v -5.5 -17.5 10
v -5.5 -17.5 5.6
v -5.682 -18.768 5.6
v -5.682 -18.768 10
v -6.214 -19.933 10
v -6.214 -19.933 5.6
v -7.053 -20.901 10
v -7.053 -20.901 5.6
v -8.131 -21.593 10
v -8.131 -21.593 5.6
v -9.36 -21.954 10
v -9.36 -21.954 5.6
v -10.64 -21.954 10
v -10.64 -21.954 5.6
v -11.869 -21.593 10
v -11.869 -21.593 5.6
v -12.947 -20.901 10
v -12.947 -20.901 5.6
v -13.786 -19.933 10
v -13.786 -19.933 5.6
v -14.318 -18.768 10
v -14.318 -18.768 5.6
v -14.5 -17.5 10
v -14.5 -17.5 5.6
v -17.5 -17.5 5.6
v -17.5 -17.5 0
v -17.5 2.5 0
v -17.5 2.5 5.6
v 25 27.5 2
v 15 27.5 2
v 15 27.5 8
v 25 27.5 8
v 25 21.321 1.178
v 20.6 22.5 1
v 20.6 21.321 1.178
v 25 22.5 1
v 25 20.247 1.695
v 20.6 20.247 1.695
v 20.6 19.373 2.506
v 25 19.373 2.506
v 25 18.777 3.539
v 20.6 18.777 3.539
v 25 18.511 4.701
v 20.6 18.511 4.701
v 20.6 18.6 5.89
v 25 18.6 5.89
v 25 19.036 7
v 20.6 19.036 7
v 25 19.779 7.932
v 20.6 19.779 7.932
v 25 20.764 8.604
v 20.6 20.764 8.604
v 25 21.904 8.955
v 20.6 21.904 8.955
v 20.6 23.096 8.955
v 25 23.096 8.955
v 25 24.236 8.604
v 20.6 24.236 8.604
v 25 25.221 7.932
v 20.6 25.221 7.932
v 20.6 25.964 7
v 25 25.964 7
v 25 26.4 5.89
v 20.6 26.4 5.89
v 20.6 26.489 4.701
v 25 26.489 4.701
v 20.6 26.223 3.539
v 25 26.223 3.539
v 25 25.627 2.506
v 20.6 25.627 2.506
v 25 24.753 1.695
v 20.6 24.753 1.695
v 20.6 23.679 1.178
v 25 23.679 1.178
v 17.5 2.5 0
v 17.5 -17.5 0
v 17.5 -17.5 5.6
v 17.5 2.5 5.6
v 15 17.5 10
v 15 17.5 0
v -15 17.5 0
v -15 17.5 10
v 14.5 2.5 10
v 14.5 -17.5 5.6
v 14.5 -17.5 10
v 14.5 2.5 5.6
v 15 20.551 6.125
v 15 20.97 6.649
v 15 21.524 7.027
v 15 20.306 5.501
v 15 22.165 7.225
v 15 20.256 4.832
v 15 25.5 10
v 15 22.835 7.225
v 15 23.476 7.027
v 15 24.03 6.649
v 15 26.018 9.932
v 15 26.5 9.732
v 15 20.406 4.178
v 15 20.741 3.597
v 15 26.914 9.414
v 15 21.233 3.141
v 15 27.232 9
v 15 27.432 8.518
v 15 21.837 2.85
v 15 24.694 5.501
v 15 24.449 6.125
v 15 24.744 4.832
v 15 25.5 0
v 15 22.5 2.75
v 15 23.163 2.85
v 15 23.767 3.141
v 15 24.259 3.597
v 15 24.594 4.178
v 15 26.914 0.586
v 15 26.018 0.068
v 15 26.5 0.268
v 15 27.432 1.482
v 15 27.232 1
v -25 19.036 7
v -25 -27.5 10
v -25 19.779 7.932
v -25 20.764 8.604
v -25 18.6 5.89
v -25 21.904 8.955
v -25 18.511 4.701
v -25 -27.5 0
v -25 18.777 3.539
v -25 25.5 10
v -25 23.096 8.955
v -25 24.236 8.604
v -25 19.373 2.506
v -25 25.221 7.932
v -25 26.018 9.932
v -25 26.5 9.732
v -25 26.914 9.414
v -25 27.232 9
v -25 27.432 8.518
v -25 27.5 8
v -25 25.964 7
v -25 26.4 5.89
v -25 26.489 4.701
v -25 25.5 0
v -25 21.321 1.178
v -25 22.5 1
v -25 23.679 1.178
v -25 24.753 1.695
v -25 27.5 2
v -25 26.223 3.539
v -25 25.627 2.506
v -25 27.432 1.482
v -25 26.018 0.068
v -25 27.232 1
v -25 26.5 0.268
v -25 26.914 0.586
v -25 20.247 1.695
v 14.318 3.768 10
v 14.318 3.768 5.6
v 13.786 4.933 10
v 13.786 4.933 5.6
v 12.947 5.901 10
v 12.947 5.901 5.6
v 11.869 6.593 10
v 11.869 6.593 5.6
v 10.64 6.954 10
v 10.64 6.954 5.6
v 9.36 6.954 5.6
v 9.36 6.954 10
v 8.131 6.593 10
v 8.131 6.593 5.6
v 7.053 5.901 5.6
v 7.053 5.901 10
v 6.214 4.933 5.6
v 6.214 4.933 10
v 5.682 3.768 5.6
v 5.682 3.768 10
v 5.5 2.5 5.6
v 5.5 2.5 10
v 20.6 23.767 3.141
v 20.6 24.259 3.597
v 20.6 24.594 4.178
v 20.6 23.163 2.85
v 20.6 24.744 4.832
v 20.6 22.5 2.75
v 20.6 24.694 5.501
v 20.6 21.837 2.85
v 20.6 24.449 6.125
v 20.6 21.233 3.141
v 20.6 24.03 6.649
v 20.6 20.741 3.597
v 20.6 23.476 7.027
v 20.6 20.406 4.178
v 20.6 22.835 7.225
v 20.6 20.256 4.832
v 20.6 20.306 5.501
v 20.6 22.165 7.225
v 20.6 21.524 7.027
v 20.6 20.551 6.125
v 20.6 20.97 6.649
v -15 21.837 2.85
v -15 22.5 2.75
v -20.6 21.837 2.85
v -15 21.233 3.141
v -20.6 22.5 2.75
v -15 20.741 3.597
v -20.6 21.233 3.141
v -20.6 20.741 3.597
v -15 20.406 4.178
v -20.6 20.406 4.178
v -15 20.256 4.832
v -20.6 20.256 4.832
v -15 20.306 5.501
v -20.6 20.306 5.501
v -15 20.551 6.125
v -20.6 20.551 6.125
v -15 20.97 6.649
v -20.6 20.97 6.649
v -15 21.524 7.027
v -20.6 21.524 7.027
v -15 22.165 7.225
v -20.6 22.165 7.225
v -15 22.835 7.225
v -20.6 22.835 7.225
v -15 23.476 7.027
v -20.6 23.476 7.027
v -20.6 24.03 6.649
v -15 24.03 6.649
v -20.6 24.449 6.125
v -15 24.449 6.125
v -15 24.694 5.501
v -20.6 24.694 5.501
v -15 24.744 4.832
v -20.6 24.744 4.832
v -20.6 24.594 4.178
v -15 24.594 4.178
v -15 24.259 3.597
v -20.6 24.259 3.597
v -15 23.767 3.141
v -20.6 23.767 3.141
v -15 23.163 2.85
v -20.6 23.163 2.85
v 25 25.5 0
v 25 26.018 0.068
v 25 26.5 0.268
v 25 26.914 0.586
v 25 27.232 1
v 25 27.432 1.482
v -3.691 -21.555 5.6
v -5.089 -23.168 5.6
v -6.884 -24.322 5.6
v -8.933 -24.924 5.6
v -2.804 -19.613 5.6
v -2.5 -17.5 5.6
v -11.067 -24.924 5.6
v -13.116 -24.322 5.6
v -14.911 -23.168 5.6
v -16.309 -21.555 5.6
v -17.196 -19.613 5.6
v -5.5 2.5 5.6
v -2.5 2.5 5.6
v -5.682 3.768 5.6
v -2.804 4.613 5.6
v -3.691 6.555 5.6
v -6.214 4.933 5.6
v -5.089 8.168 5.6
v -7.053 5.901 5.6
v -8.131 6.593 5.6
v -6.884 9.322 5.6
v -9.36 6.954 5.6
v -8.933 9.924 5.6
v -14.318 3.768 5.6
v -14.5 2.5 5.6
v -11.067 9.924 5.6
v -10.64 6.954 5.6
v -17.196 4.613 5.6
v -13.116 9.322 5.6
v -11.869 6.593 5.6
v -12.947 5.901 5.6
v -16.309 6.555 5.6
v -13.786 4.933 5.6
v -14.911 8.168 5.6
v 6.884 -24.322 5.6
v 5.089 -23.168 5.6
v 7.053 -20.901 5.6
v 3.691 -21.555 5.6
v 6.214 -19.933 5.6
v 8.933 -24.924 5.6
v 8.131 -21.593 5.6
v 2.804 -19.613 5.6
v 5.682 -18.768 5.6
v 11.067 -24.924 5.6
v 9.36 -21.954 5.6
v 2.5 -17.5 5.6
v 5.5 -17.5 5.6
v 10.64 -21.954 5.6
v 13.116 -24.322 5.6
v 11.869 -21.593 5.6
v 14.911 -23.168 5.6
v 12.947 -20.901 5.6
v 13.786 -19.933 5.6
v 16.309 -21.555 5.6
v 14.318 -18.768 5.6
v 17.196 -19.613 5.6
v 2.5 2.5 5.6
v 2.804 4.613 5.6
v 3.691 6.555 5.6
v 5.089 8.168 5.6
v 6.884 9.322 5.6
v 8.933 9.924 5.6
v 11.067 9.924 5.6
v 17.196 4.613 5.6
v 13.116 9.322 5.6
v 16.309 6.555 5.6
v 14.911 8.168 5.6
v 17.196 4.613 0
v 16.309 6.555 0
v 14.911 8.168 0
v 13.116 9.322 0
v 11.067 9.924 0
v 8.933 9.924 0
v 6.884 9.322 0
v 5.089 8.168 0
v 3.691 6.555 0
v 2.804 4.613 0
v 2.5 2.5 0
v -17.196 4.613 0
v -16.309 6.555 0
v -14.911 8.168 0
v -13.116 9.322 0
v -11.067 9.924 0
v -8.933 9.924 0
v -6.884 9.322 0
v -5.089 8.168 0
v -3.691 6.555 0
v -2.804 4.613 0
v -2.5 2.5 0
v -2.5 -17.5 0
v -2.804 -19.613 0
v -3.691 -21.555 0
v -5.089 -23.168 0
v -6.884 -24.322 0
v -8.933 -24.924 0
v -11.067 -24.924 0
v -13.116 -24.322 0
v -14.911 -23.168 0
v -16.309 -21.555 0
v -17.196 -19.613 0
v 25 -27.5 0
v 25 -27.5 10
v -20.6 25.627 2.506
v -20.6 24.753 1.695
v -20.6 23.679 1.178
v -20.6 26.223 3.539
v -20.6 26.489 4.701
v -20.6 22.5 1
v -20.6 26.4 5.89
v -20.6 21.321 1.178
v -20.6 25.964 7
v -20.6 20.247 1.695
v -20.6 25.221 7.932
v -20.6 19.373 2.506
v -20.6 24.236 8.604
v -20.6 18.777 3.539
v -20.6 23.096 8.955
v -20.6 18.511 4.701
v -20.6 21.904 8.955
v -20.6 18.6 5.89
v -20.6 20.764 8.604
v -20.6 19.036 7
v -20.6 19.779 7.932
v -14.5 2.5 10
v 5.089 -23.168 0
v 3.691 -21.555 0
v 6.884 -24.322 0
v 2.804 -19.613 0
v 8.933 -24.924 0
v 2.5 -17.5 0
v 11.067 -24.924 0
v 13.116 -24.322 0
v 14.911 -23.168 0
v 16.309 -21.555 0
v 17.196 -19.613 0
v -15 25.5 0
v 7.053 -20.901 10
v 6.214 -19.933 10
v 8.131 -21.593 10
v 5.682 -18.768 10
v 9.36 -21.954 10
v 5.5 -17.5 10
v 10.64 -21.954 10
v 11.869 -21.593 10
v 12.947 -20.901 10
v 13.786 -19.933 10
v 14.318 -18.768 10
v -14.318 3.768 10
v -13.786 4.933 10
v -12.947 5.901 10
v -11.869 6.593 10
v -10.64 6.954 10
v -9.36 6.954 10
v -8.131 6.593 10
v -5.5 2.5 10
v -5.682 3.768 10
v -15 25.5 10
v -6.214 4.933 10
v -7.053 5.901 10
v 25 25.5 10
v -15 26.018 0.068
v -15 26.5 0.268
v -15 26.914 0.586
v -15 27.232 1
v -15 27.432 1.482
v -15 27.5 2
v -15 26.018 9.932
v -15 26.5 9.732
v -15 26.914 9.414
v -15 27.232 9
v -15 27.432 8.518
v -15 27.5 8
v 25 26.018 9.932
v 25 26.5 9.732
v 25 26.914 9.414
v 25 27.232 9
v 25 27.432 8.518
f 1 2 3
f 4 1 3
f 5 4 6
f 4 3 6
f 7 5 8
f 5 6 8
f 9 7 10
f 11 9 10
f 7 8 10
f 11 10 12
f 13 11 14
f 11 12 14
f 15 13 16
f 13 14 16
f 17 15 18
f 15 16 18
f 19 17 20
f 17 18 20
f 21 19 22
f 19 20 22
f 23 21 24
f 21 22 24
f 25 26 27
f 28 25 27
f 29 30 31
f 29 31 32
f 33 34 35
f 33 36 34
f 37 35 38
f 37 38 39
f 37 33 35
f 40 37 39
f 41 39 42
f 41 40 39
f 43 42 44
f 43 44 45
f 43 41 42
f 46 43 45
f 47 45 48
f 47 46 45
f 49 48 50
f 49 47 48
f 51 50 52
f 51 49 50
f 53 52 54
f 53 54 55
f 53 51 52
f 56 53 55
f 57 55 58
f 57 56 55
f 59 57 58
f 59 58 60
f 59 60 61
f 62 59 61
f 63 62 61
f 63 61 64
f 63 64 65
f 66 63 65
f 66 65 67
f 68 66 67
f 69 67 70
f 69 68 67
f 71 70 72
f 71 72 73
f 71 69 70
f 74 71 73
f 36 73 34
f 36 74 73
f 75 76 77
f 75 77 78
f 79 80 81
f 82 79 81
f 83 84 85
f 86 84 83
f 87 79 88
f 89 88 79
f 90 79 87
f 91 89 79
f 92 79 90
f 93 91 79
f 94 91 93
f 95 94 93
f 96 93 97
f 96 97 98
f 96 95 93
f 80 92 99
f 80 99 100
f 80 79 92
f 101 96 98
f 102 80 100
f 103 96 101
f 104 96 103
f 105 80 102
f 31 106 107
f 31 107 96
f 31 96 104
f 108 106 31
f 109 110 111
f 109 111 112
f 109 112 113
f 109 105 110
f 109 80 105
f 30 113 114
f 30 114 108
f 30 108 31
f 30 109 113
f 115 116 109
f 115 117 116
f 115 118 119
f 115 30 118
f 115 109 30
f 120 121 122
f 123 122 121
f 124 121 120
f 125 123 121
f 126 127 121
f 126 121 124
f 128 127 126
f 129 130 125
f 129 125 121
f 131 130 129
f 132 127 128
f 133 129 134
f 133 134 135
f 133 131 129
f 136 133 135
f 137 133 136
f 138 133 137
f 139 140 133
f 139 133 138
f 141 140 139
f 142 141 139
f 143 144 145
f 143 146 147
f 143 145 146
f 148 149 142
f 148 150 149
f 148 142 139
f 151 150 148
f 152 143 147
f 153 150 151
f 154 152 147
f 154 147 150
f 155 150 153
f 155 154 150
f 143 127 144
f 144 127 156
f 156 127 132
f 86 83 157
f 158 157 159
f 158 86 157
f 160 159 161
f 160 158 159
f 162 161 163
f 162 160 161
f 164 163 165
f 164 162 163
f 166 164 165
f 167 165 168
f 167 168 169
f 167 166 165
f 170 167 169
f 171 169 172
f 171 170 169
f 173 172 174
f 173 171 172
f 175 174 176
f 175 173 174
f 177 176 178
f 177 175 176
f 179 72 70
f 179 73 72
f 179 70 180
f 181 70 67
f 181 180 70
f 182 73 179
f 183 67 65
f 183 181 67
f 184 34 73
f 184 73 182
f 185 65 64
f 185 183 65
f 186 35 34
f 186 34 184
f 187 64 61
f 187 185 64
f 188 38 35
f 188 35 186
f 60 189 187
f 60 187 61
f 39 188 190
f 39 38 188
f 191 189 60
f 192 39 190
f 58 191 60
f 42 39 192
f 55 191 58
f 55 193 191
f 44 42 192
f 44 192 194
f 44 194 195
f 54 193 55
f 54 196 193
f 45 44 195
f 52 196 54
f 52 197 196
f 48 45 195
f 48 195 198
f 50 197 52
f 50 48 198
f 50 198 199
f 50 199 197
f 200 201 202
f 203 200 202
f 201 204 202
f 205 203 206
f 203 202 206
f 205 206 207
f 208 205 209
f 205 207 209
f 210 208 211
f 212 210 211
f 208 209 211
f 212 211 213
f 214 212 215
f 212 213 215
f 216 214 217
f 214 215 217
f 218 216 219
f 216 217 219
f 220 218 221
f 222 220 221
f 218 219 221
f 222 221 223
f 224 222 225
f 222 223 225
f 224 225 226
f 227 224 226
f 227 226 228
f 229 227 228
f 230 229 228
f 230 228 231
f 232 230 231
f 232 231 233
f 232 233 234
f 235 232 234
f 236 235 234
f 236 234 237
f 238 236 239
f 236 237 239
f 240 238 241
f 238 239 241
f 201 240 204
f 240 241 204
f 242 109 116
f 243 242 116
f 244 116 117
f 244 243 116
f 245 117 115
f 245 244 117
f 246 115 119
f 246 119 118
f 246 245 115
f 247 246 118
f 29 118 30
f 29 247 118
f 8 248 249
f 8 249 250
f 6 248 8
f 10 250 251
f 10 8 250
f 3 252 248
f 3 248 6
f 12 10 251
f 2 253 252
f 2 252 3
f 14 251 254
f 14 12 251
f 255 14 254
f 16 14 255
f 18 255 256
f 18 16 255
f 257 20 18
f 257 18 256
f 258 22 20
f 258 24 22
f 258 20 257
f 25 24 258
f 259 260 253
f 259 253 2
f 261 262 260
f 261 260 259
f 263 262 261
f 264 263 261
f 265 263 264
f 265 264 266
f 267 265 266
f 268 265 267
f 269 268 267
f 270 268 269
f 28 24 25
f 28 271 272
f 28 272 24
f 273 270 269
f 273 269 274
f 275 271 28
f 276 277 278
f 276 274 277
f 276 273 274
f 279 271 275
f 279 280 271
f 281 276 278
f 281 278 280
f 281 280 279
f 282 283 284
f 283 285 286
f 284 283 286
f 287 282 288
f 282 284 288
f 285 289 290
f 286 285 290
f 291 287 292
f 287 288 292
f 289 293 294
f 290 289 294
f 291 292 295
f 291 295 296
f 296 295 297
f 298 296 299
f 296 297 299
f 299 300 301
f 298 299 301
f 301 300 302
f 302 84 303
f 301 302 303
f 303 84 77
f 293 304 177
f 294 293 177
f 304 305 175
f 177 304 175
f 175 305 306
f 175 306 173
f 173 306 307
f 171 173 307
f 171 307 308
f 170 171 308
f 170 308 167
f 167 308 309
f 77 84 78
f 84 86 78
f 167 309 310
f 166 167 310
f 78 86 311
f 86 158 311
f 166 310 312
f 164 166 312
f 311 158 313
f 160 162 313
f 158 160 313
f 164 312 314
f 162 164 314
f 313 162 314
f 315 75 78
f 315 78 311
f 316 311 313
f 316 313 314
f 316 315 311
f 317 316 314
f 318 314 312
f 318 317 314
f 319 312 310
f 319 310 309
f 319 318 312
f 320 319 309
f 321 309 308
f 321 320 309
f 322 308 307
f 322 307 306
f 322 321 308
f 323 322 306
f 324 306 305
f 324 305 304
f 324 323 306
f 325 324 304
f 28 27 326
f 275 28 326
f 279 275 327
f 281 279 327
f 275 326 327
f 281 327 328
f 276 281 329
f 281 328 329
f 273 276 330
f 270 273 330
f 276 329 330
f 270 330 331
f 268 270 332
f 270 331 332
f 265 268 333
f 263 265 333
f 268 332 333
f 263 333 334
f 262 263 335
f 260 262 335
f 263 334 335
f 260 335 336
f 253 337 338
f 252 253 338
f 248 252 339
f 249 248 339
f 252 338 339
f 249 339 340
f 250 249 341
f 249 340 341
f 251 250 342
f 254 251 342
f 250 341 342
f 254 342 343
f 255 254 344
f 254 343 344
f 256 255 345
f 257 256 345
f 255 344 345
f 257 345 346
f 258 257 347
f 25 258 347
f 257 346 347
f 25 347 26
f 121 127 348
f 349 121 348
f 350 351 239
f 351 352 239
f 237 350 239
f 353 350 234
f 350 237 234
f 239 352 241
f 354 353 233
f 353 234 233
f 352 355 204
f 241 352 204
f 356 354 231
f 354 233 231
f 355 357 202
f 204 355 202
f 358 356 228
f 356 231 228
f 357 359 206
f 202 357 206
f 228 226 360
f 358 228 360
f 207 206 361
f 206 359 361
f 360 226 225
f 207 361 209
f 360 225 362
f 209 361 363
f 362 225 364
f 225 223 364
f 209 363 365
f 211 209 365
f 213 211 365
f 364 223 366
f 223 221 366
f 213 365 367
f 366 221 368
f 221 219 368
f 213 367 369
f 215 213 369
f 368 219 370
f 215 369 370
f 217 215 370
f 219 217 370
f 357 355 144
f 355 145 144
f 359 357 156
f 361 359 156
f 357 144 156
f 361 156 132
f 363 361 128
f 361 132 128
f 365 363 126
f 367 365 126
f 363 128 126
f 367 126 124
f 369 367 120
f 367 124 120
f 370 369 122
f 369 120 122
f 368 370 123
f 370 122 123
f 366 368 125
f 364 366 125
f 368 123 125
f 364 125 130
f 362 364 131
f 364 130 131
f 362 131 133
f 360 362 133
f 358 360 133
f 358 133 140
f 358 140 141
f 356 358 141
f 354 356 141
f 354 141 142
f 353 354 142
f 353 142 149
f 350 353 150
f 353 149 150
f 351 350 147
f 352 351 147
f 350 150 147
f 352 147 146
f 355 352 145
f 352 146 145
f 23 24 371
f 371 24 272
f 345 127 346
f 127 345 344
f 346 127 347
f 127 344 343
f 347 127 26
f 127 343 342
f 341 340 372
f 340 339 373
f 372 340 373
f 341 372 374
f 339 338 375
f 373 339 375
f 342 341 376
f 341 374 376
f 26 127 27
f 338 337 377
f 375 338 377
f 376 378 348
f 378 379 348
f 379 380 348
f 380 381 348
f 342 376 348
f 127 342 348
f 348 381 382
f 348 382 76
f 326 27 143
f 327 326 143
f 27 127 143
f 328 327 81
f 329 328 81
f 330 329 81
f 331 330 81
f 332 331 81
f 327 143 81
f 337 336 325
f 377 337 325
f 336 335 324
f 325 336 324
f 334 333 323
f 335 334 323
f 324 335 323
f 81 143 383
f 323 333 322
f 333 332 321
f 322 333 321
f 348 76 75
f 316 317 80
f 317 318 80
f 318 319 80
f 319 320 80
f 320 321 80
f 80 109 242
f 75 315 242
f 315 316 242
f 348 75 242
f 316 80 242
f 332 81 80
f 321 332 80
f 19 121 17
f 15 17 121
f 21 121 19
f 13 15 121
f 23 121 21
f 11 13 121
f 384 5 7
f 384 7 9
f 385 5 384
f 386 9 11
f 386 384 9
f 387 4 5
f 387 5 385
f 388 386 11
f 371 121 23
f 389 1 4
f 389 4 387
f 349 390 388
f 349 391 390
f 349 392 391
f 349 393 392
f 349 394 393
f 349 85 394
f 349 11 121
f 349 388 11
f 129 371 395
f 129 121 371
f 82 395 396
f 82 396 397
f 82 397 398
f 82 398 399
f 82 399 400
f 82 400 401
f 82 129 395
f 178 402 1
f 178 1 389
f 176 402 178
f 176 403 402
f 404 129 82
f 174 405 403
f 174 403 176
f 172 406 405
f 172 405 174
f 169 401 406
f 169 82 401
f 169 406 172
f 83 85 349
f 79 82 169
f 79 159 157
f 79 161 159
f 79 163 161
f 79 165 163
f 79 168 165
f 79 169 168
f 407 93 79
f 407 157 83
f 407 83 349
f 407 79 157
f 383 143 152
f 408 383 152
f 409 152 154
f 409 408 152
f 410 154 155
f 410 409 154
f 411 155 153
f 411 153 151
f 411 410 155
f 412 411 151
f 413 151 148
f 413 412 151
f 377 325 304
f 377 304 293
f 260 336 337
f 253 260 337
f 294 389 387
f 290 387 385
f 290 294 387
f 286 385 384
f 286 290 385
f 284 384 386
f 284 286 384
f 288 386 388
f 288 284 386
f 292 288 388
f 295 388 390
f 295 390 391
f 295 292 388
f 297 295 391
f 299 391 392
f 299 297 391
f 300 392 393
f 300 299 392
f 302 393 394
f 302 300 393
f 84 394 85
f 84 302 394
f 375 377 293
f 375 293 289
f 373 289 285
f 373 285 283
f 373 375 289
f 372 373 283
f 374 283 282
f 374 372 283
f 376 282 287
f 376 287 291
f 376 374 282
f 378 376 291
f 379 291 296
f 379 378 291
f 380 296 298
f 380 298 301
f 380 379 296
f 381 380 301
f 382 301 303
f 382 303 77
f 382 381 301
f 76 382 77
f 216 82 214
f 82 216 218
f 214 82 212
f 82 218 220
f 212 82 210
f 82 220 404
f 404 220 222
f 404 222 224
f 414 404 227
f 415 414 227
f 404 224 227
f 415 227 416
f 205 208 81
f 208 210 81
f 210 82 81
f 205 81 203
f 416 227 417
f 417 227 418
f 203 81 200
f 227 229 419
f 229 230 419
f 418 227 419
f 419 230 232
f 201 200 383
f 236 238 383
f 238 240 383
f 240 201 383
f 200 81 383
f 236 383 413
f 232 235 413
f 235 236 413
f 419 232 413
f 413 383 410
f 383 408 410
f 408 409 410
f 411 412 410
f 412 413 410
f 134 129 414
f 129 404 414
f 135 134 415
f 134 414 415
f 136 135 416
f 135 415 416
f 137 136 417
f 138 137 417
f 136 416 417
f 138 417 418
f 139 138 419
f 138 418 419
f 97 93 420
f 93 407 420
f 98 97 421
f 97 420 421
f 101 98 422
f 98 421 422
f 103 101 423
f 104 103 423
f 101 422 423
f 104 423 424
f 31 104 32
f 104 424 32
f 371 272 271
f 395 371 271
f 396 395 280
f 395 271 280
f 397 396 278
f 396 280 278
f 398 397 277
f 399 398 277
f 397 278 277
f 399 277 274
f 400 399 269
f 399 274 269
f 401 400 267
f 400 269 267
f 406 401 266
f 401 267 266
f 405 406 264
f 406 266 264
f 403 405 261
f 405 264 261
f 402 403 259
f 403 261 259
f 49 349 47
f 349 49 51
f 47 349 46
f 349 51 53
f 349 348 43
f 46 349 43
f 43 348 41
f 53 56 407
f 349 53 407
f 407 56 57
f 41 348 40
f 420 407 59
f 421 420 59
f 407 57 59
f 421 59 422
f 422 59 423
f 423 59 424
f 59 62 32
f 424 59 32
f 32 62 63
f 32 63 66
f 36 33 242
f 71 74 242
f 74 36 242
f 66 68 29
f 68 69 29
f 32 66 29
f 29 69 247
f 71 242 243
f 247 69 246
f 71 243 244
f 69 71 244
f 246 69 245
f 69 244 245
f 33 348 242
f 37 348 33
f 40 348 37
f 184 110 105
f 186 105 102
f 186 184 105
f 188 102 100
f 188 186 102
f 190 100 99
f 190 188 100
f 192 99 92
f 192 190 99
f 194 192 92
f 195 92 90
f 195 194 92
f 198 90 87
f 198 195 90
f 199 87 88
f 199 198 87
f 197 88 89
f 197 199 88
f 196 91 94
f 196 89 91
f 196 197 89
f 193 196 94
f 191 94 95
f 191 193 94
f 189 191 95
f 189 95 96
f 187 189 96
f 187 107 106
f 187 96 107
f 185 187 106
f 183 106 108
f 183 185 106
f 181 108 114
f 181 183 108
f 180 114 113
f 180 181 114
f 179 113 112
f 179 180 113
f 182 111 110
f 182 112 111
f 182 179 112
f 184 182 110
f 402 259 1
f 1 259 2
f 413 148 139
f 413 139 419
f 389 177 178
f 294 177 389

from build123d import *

# Parameters (mm, degrees)
SKETCH1_W           = 50
SKETCH1_H           = 55
BOSS_EXTRUDE3_DEPTH = 10
SKETCH2_W           = 30
SKETCH2_H           = 10
CUT_EXTRUDE2_DEPTH  = 10
CUT_EXTRUDE3_DEPTH  = 5.6
FILLET1_R           = 2


with BuildPart() as part:
    # Sketch1 → Boss-Extrude3 (new body)
    with BuildSketch(Plane.XY):
        Rectangle(SKETCH1_W, SKETCH1_H)
        with BuildLine():
            Line((-5.5, 2.5), (-5.5, -17.5))
            ThreePointArc((-5.5, -17.5), (-10, -22), (-14.5, -17.5))
            Line((-14.5, -17.5), (-14.5, 2.5))
            ThreePointArc((-14.5, 2.5), (-10, 7), (-5.5, 2.5))
        make_face(mode=Mode.SUBTRACT)
        with BuildLine():
            Line((5.5, 2.5), (5.5, -17.5))
            ThreePointArc((5.5, -17.5), (10, -22), (14.5, -17.5))
            Line((14.5, -17.5), (14.5, 2.5))
            ThreePointArc((14.5, 2.5), (10, 7), (5.5, 2.5))
        make_face(mode=Mode.SUBTRACT)
    extrude(amount=BOSS_EXTRUDE3_DEPTH)

    # Sketch2 → Cut-Extrude2 (cut)
    with BuildSketch(Plane(origin=(0, 0, 0), x_dir=(-1, 0, 0), z_dir=(0, 0, -1))):
        with Locations((0, 22.5)):
            Rectangle(SKETCH2_W, SKETCH2_H)
    extrude(amount=-CUT_EXTRUDE2_DEPTH, mode=Mode.SUBTRACT)

    # Sketch6 → CBORE for M4 Hex Socket Head Cap Screw1 (revolve, cut)
    with BuildSketch(Plane(origin=(25, 22.5, 5), x_dir=(0, 0, -1), z_dir=(0, 1, 0))):
        Polygon((0, 0), (0, 15.351936393), (2.25, 14), (2.25, 4.4), (4, 4.4), (4, 0), align=None)
    cbore_for_m4_hex_socket_head_cap_screw1 = revolve(axis=Axis((31.35, 22.5, 5), (-1, 0, 0)), mode=Mode.SUBTRACT)

    # Mirror1: CBORE for M4 Hex Socket Head Cap Screw1 across plane
    add(cbore_for_m4_hex_socket_head_cap_screw1.mirror(Plane(origin=(0, 0, 0), x_dir=(0, 0, 1), z_dir=(1, 0, 0))), mode=Mode.SUBTRACT)

    # Sketch7 → Cut-Extrude3 (cut)
    with BuildSketch(Plane(origin=(0, 0, 0), x_dir=(-1, 0, 0), z_dir=(0, 0, -1))):
        with BuildLine():
            Line((-2.5, 2.5), (-2.5, -17.5))
            ThreePointArc((-2.5, -17.5), (-10, -25), (-17.5, -17.5))
            Line((-17.5, -17.5), (-17.5, 2.5))
            ThreePointArc((-17.5, 2.5), (-10, 10), (-2.5, 2.5))
        make_face()
        with BuildLine():
            Line((2.5, 2.5), (2.5, -17.5))
            ThreePointArc((2.5, -17.5), (10, -25), (17.5, -17.5))
            Line((17.5, -17.5), (17.5, 2.5))
            ThreePointArc((17.5, 2.5), (10, 10), (2.5, 2.5))
        make_face()
    extrude(amount=-CUT_EXTRUDE3_DEPTH, mode=Mode.SUBTRACT)

    # Fillet1
    fillet1_edges = [part.edges().sort_by_distance(p)[0] for p in [
        (-20, 27.5, 0),
        (-20, 27.5, 10),
        (20, 27.5, 0),
        (20, 27.5, 10),
    ]]
    fillet(fillet1_edges, radius=FILLET1_R)


solid = part.part
